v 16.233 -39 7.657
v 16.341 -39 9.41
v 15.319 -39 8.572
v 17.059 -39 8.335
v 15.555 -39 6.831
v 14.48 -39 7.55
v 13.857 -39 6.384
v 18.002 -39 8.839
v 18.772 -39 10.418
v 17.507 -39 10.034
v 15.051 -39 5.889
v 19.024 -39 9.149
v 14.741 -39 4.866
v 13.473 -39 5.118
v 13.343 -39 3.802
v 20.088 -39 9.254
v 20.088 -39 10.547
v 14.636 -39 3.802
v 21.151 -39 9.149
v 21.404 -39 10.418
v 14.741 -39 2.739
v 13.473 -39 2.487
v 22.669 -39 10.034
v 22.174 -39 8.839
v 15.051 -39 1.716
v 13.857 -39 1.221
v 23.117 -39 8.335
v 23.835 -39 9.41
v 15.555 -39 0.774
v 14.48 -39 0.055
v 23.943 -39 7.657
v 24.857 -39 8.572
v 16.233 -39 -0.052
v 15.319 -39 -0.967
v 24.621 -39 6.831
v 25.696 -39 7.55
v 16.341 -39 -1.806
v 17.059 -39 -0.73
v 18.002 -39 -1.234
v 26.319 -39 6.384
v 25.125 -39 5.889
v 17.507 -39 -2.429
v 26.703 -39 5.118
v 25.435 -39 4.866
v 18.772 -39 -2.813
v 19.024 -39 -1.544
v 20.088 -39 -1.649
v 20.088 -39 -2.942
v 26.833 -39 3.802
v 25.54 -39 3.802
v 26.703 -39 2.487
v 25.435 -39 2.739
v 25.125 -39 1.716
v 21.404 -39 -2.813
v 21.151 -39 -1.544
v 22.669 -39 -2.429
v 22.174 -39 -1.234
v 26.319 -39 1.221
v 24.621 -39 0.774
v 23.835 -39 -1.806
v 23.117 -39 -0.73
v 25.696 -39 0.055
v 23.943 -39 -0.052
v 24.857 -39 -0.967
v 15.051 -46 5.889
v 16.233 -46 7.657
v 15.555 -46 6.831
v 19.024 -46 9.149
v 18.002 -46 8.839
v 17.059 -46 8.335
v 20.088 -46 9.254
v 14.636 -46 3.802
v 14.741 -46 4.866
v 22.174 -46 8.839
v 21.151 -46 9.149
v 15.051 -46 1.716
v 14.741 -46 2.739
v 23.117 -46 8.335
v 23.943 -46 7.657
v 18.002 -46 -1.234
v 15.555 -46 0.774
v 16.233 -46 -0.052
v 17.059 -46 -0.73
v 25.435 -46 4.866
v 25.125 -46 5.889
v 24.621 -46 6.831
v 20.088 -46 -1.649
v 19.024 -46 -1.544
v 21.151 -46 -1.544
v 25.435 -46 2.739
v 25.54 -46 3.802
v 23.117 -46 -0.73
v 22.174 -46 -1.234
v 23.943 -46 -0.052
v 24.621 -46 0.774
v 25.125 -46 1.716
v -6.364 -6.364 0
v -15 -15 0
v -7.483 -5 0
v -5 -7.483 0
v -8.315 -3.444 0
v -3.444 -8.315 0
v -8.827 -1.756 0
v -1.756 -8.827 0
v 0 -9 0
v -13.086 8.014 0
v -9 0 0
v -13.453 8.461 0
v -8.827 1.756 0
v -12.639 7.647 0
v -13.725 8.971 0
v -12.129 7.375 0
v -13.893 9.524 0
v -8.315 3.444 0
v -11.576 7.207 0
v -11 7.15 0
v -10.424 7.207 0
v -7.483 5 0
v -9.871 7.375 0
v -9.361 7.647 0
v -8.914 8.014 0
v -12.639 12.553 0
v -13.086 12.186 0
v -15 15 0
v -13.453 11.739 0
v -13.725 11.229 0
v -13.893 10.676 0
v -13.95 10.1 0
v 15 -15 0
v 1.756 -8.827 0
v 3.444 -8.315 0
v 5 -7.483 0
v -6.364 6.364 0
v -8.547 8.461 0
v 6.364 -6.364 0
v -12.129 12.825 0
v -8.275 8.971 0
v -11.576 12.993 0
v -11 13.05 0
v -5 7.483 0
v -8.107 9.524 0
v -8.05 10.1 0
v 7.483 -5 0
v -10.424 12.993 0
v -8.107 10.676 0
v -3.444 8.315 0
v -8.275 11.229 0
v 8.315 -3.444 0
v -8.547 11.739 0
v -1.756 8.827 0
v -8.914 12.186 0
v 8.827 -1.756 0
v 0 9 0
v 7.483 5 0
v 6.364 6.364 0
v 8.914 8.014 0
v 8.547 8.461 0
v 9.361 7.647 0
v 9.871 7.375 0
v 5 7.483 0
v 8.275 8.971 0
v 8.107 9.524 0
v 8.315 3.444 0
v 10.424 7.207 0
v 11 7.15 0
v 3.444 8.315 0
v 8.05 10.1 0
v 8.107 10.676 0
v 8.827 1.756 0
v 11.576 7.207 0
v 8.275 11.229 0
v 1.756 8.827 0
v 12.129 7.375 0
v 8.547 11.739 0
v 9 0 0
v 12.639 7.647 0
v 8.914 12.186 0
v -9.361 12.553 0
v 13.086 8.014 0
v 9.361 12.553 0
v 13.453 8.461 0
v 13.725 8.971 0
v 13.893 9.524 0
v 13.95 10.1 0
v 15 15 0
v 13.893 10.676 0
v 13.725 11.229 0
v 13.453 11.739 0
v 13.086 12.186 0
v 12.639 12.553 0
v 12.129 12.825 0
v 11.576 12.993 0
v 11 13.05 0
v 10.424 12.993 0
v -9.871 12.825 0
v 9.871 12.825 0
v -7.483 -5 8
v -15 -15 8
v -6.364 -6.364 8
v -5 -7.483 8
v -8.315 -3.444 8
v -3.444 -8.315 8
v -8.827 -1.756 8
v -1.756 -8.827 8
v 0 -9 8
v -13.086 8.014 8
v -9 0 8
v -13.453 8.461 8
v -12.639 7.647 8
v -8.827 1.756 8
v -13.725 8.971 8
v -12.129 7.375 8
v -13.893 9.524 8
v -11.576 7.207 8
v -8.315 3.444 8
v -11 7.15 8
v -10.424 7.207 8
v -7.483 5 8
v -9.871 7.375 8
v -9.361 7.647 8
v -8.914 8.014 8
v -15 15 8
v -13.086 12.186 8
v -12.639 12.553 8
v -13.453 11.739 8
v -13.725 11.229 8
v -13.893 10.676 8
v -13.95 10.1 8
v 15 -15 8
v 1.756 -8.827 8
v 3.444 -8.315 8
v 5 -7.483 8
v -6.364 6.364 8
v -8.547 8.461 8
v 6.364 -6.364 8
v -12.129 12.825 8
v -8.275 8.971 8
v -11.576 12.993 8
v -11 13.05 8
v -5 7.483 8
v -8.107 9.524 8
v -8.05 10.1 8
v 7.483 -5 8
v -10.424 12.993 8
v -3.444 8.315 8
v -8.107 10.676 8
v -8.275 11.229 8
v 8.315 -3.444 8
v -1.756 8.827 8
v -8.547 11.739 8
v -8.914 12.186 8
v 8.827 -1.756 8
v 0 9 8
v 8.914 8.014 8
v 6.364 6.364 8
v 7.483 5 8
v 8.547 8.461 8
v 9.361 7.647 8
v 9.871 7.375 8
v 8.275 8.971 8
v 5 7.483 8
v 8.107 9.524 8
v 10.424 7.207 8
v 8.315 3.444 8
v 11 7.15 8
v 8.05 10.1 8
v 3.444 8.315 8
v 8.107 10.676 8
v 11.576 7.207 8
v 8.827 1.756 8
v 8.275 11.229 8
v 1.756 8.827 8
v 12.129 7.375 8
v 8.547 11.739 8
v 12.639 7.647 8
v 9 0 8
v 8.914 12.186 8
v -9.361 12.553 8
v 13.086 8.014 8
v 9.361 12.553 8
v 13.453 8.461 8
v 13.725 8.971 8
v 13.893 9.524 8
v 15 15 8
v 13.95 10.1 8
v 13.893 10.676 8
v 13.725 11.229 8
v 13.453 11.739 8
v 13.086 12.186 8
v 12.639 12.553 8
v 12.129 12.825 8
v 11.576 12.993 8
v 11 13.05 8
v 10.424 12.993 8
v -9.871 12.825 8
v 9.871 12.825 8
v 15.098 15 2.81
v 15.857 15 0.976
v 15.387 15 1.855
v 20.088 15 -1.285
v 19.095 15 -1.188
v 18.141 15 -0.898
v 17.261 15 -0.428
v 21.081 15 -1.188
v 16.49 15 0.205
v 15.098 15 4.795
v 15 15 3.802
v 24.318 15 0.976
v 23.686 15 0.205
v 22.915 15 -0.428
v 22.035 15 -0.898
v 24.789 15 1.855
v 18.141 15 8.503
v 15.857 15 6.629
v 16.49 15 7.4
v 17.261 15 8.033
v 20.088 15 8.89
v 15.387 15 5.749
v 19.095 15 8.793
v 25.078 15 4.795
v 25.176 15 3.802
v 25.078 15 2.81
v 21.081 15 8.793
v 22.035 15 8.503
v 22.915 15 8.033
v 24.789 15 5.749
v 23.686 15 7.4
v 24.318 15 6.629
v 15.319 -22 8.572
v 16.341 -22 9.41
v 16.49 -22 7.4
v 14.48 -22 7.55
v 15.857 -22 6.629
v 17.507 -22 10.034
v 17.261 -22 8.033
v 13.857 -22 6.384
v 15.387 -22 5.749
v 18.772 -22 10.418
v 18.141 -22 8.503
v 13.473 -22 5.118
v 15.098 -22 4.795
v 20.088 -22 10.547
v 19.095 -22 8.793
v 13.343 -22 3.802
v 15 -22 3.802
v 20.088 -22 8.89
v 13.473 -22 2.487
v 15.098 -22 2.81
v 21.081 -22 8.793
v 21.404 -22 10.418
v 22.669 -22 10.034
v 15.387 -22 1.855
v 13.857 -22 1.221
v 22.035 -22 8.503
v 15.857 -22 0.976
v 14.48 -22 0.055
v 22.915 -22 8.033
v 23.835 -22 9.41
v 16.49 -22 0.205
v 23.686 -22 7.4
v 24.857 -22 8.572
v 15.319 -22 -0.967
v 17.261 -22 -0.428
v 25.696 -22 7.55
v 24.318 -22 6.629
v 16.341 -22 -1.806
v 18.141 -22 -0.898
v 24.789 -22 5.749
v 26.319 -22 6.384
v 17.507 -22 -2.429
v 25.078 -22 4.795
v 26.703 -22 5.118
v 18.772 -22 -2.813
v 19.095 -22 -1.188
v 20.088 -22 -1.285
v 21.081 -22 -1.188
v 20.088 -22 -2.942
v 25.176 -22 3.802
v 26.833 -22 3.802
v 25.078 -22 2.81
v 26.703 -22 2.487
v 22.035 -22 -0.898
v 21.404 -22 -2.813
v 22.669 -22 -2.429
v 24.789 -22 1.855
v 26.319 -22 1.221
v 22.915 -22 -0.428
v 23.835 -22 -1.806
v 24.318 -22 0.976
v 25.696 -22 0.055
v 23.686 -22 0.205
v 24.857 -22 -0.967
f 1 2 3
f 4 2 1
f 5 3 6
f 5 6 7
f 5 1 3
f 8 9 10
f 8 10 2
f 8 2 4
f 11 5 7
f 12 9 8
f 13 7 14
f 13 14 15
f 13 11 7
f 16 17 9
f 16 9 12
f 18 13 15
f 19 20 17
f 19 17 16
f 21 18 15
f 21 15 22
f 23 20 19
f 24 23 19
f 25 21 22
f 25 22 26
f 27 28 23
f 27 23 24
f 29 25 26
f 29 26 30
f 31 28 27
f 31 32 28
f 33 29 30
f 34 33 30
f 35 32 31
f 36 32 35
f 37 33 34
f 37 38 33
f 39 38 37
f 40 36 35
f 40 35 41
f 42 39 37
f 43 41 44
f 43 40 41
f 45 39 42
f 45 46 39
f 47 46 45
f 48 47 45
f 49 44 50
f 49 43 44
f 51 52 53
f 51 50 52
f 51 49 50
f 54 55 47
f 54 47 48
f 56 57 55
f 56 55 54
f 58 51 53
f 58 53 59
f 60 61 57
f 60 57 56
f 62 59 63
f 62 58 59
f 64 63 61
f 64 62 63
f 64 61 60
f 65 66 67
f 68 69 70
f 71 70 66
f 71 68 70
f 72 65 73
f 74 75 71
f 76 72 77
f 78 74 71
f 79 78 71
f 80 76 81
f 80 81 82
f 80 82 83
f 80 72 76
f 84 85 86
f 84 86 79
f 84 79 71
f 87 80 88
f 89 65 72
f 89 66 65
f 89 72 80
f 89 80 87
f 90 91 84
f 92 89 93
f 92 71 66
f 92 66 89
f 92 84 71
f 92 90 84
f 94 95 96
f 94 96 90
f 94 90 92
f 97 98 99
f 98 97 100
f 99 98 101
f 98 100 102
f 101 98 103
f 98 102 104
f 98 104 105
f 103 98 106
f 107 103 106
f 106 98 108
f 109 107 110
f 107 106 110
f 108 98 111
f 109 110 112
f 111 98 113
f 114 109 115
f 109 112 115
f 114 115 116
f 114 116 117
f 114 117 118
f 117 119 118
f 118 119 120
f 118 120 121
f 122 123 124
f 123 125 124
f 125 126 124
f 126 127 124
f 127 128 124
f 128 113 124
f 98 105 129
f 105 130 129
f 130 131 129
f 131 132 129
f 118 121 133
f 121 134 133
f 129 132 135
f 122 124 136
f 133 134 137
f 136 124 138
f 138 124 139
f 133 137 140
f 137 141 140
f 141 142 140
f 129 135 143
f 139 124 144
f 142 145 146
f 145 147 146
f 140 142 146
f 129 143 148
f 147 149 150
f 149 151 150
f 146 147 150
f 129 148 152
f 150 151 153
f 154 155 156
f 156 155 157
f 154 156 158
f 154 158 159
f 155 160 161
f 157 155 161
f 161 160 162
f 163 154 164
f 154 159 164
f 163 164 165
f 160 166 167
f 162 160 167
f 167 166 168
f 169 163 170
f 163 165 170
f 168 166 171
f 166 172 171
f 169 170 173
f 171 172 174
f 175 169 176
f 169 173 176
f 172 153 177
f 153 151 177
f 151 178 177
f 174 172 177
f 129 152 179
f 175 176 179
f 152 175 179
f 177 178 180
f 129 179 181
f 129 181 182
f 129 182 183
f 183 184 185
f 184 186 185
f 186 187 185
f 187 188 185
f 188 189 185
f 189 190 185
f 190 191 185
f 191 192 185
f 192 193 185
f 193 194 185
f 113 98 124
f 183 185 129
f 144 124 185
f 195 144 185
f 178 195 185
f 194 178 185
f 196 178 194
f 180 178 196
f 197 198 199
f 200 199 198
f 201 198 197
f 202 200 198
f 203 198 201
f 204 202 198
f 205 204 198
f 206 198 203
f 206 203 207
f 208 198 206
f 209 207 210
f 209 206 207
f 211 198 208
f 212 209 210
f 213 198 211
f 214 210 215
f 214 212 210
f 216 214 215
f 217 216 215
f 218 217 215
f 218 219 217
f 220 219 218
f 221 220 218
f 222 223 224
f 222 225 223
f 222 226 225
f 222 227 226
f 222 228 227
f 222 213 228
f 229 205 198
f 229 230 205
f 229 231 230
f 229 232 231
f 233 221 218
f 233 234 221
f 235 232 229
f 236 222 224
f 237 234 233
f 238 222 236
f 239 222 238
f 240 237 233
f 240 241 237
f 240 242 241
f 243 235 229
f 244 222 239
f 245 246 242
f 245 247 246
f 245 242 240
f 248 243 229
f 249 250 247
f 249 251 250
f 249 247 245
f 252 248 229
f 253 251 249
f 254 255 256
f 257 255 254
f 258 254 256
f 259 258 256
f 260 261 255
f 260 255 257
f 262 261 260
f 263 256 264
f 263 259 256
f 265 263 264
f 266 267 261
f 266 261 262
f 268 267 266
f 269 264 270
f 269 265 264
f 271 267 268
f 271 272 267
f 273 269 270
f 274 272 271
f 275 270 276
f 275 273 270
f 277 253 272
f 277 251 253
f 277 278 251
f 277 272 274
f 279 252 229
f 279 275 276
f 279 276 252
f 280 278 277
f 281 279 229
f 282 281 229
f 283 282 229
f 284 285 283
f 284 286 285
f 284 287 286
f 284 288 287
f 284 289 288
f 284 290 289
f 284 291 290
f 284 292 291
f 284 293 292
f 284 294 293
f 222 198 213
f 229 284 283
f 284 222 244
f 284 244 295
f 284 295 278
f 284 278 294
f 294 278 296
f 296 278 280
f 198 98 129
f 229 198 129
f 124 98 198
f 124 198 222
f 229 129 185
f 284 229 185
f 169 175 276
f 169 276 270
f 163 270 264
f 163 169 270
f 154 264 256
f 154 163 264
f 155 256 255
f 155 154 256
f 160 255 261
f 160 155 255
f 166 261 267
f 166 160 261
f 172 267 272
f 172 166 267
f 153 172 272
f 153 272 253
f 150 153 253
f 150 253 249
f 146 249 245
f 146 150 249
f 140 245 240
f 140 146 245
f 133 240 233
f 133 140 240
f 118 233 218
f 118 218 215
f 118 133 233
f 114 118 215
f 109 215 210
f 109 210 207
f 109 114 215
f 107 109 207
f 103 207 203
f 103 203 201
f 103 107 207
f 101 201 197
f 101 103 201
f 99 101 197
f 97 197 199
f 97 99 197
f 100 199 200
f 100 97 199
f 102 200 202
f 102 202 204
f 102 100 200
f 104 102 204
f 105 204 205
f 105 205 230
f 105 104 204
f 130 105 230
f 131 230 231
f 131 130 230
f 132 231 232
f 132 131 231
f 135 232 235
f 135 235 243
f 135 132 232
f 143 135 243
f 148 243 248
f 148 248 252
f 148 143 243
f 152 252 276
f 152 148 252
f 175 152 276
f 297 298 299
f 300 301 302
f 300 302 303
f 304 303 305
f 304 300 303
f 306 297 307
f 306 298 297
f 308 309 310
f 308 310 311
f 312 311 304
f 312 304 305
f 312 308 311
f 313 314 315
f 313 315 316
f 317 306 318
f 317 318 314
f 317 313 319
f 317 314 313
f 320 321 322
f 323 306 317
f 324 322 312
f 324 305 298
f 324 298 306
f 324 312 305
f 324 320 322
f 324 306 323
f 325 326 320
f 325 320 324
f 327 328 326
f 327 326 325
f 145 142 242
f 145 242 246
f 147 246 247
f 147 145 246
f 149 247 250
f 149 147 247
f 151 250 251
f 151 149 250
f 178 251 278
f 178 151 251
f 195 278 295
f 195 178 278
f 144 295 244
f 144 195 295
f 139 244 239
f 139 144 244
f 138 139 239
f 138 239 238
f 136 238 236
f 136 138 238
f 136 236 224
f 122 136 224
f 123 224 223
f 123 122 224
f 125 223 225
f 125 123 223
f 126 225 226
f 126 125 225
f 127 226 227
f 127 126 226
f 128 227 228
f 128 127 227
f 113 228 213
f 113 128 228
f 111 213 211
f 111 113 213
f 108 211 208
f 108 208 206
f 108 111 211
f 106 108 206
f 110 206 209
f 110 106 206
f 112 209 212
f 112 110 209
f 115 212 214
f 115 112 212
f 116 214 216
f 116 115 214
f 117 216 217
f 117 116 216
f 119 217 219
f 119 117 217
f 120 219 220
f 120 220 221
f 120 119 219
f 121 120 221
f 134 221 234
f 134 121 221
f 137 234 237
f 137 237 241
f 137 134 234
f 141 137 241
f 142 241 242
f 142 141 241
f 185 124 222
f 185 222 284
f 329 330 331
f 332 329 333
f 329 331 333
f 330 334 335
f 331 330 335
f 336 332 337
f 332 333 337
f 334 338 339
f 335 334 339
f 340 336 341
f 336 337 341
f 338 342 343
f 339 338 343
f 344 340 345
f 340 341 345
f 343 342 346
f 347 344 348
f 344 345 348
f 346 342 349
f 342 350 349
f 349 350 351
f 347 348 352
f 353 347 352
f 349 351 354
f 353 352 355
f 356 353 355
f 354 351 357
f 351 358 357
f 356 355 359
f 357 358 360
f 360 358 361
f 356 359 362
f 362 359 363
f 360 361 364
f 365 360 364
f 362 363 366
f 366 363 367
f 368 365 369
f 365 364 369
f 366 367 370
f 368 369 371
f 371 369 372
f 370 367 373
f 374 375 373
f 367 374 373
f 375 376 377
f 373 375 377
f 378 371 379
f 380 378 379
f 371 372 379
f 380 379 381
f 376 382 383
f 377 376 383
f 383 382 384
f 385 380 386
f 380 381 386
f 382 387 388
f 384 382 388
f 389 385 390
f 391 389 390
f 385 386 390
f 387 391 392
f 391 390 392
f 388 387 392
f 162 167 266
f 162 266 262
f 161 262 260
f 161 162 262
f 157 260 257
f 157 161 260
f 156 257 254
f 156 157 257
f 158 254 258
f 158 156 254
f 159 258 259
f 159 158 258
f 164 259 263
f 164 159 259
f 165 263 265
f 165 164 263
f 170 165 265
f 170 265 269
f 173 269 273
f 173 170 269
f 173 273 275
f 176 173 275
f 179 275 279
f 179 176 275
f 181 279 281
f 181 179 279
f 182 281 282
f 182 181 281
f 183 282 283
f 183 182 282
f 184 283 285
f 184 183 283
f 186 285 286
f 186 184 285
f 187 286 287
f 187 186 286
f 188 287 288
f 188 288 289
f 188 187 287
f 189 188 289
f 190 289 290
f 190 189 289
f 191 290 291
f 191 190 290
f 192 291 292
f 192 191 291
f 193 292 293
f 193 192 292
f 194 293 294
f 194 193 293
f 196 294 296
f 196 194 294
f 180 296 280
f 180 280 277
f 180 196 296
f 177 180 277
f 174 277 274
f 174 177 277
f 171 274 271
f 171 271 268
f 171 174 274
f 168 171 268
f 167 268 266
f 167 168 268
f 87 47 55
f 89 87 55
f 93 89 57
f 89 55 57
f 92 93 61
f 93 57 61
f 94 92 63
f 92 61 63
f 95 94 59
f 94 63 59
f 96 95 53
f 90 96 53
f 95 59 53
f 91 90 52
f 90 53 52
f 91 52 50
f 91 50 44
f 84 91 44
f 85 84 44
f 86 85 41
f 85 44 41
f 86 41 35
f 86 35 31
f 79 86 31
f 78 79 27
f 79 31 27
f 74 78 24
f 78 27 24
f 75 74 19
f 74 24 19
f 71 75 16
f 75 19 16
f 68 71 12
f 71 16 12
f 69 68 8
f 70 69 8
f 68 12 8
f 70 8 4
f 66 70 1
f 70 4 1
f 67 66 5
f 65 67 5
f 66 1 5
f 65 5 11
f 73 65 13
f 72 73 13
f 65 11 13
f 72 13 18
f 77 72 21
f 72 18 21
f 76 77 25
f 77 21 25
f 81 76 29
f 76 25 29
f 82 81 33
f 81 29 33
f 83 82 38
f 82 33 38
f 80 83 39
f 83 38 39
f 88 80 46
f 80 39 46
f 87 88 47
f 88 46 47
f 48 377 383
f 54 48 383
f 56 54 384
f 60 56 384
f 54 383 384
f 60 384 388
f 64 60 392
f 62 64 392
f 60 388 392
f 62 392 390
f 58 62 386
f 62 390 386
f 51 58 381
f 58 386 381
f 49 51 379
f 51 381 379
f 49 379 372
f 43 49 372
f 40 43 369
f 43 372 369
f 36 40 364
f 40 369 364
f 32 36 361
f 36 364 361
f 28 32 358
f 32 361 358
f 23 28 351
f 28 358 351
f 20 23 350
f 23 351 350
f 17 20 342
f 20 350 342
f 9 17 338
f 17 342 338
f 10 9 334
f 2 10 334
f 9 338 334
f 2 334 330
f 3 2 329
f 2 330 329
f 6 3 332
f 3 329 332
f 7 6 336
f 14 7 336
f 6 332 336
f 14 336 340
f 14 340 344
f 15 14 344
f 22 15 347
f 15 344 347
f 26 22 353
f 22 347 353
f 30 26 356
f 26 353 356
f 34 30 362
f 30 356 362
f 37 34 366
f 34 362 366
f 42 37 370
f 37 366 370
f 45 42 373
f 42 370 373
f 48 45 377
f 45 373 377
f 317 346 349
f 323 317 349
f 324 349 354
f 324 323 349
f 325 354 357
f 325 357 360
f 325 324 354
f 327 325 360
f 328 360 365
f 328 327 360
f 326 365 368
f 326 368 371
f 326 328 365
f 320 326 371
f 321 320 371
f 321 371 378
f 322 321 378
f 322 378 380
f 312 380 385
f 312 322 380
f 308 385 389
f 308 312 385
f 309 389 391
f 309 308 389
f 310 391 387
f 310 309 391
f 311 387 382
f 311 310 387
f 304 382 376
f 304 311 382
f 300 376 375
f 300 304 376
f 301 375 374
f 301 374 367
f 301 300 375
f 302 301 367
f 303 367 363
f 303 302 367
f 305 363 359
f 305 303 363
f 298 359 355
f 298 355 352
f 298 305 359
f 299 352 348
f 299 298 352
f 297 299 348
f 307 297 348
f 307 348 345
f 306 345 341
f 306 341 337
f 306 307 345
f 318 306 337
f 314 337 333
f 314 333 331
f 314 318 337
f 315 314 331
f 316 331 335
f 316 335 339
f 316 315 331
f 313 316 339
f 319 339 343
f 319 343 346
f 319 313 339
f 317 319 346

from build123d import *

# Parameters (mm, degrees)
CROQUIS1_W              = 30
CROQUIS1_H              = 30
CROQUIS1_R              = 9
CROQUIS1_R_2            = 2.95
SALIENTE_EXTRUIR2_DEPTH = 8
CROQUIS3_R              = 5.087919121
SALIENTE_EXTRUIR3_DEPTH = 37
CROQUIS4_R              = 6.744773562
SALIENTE_EXTRUIR4_DEPTH = 17
CROQUIS5_R              = 5.451659249
SALIENTE_EXTRUIR5_DEPTH = 7


with BuildPart() as part:
    # Croquis1 → Saliente-Extruir2 (new body)
    with BuildSketch(Plane.XY):
        Rectangle(CROQUIS1_W, CROQUIS1_H)
        Circle(CROQUIS1_R, mode=Mode.SUBTRACT)
        with Locations((-11, 10.1)):
            Circle(CROQUIS1_R_2, mode=Mode.SUBTRACT)
        with Locations(Location((11, 10.1, 0), (0, 0, 180))):
            Circle(CROQUIS1_R_2, mode=Mode.SUBTRACT)
    extrude(amount=SALIENTE_EXTRUIR2_DEPTH)


with BuildPart() as body_2:
    # Croquis3 → Saliente-Extruir3 (new body)
    with BuildSketch(Plane(origin=(0, 15, 0), x_dir=(1, 0, 0), z_dir=(0, 1, 0))):
        with Locations(Location((20.087919121, -3.80242042, 0), (0, 0, 270))):
            Circle(CROQUIS3_R)
    extrude(amount=-SALIENTE_EXTRUIR3_DEPTH)

    # Croquis4 → Saliente-Extruir4 (add)
    with BuildSketch(Plane.XZ.offset(22)):
        with Locations(Location((20.087919121, 3.80242042, 0), (0, 0, 270))):
            Circle(CROQUIS4_R)
    extrude(amount=SALIENTE_EXTRUIR4_DEPTH)

    # Croquis5 → Saliente-Extruir5 (add)
    with BuildSketch(Plane.XZ.offset(39)):
        with Locations(Location((20.087919121, 3.80242042, 0), (0, 0, 270))):
            Circle(CROQUIS5_R)
    extrude(amount=SALIENTE_EXTRUIR5_DEPTH)


solid = Compound([part.part, body_2.part])
